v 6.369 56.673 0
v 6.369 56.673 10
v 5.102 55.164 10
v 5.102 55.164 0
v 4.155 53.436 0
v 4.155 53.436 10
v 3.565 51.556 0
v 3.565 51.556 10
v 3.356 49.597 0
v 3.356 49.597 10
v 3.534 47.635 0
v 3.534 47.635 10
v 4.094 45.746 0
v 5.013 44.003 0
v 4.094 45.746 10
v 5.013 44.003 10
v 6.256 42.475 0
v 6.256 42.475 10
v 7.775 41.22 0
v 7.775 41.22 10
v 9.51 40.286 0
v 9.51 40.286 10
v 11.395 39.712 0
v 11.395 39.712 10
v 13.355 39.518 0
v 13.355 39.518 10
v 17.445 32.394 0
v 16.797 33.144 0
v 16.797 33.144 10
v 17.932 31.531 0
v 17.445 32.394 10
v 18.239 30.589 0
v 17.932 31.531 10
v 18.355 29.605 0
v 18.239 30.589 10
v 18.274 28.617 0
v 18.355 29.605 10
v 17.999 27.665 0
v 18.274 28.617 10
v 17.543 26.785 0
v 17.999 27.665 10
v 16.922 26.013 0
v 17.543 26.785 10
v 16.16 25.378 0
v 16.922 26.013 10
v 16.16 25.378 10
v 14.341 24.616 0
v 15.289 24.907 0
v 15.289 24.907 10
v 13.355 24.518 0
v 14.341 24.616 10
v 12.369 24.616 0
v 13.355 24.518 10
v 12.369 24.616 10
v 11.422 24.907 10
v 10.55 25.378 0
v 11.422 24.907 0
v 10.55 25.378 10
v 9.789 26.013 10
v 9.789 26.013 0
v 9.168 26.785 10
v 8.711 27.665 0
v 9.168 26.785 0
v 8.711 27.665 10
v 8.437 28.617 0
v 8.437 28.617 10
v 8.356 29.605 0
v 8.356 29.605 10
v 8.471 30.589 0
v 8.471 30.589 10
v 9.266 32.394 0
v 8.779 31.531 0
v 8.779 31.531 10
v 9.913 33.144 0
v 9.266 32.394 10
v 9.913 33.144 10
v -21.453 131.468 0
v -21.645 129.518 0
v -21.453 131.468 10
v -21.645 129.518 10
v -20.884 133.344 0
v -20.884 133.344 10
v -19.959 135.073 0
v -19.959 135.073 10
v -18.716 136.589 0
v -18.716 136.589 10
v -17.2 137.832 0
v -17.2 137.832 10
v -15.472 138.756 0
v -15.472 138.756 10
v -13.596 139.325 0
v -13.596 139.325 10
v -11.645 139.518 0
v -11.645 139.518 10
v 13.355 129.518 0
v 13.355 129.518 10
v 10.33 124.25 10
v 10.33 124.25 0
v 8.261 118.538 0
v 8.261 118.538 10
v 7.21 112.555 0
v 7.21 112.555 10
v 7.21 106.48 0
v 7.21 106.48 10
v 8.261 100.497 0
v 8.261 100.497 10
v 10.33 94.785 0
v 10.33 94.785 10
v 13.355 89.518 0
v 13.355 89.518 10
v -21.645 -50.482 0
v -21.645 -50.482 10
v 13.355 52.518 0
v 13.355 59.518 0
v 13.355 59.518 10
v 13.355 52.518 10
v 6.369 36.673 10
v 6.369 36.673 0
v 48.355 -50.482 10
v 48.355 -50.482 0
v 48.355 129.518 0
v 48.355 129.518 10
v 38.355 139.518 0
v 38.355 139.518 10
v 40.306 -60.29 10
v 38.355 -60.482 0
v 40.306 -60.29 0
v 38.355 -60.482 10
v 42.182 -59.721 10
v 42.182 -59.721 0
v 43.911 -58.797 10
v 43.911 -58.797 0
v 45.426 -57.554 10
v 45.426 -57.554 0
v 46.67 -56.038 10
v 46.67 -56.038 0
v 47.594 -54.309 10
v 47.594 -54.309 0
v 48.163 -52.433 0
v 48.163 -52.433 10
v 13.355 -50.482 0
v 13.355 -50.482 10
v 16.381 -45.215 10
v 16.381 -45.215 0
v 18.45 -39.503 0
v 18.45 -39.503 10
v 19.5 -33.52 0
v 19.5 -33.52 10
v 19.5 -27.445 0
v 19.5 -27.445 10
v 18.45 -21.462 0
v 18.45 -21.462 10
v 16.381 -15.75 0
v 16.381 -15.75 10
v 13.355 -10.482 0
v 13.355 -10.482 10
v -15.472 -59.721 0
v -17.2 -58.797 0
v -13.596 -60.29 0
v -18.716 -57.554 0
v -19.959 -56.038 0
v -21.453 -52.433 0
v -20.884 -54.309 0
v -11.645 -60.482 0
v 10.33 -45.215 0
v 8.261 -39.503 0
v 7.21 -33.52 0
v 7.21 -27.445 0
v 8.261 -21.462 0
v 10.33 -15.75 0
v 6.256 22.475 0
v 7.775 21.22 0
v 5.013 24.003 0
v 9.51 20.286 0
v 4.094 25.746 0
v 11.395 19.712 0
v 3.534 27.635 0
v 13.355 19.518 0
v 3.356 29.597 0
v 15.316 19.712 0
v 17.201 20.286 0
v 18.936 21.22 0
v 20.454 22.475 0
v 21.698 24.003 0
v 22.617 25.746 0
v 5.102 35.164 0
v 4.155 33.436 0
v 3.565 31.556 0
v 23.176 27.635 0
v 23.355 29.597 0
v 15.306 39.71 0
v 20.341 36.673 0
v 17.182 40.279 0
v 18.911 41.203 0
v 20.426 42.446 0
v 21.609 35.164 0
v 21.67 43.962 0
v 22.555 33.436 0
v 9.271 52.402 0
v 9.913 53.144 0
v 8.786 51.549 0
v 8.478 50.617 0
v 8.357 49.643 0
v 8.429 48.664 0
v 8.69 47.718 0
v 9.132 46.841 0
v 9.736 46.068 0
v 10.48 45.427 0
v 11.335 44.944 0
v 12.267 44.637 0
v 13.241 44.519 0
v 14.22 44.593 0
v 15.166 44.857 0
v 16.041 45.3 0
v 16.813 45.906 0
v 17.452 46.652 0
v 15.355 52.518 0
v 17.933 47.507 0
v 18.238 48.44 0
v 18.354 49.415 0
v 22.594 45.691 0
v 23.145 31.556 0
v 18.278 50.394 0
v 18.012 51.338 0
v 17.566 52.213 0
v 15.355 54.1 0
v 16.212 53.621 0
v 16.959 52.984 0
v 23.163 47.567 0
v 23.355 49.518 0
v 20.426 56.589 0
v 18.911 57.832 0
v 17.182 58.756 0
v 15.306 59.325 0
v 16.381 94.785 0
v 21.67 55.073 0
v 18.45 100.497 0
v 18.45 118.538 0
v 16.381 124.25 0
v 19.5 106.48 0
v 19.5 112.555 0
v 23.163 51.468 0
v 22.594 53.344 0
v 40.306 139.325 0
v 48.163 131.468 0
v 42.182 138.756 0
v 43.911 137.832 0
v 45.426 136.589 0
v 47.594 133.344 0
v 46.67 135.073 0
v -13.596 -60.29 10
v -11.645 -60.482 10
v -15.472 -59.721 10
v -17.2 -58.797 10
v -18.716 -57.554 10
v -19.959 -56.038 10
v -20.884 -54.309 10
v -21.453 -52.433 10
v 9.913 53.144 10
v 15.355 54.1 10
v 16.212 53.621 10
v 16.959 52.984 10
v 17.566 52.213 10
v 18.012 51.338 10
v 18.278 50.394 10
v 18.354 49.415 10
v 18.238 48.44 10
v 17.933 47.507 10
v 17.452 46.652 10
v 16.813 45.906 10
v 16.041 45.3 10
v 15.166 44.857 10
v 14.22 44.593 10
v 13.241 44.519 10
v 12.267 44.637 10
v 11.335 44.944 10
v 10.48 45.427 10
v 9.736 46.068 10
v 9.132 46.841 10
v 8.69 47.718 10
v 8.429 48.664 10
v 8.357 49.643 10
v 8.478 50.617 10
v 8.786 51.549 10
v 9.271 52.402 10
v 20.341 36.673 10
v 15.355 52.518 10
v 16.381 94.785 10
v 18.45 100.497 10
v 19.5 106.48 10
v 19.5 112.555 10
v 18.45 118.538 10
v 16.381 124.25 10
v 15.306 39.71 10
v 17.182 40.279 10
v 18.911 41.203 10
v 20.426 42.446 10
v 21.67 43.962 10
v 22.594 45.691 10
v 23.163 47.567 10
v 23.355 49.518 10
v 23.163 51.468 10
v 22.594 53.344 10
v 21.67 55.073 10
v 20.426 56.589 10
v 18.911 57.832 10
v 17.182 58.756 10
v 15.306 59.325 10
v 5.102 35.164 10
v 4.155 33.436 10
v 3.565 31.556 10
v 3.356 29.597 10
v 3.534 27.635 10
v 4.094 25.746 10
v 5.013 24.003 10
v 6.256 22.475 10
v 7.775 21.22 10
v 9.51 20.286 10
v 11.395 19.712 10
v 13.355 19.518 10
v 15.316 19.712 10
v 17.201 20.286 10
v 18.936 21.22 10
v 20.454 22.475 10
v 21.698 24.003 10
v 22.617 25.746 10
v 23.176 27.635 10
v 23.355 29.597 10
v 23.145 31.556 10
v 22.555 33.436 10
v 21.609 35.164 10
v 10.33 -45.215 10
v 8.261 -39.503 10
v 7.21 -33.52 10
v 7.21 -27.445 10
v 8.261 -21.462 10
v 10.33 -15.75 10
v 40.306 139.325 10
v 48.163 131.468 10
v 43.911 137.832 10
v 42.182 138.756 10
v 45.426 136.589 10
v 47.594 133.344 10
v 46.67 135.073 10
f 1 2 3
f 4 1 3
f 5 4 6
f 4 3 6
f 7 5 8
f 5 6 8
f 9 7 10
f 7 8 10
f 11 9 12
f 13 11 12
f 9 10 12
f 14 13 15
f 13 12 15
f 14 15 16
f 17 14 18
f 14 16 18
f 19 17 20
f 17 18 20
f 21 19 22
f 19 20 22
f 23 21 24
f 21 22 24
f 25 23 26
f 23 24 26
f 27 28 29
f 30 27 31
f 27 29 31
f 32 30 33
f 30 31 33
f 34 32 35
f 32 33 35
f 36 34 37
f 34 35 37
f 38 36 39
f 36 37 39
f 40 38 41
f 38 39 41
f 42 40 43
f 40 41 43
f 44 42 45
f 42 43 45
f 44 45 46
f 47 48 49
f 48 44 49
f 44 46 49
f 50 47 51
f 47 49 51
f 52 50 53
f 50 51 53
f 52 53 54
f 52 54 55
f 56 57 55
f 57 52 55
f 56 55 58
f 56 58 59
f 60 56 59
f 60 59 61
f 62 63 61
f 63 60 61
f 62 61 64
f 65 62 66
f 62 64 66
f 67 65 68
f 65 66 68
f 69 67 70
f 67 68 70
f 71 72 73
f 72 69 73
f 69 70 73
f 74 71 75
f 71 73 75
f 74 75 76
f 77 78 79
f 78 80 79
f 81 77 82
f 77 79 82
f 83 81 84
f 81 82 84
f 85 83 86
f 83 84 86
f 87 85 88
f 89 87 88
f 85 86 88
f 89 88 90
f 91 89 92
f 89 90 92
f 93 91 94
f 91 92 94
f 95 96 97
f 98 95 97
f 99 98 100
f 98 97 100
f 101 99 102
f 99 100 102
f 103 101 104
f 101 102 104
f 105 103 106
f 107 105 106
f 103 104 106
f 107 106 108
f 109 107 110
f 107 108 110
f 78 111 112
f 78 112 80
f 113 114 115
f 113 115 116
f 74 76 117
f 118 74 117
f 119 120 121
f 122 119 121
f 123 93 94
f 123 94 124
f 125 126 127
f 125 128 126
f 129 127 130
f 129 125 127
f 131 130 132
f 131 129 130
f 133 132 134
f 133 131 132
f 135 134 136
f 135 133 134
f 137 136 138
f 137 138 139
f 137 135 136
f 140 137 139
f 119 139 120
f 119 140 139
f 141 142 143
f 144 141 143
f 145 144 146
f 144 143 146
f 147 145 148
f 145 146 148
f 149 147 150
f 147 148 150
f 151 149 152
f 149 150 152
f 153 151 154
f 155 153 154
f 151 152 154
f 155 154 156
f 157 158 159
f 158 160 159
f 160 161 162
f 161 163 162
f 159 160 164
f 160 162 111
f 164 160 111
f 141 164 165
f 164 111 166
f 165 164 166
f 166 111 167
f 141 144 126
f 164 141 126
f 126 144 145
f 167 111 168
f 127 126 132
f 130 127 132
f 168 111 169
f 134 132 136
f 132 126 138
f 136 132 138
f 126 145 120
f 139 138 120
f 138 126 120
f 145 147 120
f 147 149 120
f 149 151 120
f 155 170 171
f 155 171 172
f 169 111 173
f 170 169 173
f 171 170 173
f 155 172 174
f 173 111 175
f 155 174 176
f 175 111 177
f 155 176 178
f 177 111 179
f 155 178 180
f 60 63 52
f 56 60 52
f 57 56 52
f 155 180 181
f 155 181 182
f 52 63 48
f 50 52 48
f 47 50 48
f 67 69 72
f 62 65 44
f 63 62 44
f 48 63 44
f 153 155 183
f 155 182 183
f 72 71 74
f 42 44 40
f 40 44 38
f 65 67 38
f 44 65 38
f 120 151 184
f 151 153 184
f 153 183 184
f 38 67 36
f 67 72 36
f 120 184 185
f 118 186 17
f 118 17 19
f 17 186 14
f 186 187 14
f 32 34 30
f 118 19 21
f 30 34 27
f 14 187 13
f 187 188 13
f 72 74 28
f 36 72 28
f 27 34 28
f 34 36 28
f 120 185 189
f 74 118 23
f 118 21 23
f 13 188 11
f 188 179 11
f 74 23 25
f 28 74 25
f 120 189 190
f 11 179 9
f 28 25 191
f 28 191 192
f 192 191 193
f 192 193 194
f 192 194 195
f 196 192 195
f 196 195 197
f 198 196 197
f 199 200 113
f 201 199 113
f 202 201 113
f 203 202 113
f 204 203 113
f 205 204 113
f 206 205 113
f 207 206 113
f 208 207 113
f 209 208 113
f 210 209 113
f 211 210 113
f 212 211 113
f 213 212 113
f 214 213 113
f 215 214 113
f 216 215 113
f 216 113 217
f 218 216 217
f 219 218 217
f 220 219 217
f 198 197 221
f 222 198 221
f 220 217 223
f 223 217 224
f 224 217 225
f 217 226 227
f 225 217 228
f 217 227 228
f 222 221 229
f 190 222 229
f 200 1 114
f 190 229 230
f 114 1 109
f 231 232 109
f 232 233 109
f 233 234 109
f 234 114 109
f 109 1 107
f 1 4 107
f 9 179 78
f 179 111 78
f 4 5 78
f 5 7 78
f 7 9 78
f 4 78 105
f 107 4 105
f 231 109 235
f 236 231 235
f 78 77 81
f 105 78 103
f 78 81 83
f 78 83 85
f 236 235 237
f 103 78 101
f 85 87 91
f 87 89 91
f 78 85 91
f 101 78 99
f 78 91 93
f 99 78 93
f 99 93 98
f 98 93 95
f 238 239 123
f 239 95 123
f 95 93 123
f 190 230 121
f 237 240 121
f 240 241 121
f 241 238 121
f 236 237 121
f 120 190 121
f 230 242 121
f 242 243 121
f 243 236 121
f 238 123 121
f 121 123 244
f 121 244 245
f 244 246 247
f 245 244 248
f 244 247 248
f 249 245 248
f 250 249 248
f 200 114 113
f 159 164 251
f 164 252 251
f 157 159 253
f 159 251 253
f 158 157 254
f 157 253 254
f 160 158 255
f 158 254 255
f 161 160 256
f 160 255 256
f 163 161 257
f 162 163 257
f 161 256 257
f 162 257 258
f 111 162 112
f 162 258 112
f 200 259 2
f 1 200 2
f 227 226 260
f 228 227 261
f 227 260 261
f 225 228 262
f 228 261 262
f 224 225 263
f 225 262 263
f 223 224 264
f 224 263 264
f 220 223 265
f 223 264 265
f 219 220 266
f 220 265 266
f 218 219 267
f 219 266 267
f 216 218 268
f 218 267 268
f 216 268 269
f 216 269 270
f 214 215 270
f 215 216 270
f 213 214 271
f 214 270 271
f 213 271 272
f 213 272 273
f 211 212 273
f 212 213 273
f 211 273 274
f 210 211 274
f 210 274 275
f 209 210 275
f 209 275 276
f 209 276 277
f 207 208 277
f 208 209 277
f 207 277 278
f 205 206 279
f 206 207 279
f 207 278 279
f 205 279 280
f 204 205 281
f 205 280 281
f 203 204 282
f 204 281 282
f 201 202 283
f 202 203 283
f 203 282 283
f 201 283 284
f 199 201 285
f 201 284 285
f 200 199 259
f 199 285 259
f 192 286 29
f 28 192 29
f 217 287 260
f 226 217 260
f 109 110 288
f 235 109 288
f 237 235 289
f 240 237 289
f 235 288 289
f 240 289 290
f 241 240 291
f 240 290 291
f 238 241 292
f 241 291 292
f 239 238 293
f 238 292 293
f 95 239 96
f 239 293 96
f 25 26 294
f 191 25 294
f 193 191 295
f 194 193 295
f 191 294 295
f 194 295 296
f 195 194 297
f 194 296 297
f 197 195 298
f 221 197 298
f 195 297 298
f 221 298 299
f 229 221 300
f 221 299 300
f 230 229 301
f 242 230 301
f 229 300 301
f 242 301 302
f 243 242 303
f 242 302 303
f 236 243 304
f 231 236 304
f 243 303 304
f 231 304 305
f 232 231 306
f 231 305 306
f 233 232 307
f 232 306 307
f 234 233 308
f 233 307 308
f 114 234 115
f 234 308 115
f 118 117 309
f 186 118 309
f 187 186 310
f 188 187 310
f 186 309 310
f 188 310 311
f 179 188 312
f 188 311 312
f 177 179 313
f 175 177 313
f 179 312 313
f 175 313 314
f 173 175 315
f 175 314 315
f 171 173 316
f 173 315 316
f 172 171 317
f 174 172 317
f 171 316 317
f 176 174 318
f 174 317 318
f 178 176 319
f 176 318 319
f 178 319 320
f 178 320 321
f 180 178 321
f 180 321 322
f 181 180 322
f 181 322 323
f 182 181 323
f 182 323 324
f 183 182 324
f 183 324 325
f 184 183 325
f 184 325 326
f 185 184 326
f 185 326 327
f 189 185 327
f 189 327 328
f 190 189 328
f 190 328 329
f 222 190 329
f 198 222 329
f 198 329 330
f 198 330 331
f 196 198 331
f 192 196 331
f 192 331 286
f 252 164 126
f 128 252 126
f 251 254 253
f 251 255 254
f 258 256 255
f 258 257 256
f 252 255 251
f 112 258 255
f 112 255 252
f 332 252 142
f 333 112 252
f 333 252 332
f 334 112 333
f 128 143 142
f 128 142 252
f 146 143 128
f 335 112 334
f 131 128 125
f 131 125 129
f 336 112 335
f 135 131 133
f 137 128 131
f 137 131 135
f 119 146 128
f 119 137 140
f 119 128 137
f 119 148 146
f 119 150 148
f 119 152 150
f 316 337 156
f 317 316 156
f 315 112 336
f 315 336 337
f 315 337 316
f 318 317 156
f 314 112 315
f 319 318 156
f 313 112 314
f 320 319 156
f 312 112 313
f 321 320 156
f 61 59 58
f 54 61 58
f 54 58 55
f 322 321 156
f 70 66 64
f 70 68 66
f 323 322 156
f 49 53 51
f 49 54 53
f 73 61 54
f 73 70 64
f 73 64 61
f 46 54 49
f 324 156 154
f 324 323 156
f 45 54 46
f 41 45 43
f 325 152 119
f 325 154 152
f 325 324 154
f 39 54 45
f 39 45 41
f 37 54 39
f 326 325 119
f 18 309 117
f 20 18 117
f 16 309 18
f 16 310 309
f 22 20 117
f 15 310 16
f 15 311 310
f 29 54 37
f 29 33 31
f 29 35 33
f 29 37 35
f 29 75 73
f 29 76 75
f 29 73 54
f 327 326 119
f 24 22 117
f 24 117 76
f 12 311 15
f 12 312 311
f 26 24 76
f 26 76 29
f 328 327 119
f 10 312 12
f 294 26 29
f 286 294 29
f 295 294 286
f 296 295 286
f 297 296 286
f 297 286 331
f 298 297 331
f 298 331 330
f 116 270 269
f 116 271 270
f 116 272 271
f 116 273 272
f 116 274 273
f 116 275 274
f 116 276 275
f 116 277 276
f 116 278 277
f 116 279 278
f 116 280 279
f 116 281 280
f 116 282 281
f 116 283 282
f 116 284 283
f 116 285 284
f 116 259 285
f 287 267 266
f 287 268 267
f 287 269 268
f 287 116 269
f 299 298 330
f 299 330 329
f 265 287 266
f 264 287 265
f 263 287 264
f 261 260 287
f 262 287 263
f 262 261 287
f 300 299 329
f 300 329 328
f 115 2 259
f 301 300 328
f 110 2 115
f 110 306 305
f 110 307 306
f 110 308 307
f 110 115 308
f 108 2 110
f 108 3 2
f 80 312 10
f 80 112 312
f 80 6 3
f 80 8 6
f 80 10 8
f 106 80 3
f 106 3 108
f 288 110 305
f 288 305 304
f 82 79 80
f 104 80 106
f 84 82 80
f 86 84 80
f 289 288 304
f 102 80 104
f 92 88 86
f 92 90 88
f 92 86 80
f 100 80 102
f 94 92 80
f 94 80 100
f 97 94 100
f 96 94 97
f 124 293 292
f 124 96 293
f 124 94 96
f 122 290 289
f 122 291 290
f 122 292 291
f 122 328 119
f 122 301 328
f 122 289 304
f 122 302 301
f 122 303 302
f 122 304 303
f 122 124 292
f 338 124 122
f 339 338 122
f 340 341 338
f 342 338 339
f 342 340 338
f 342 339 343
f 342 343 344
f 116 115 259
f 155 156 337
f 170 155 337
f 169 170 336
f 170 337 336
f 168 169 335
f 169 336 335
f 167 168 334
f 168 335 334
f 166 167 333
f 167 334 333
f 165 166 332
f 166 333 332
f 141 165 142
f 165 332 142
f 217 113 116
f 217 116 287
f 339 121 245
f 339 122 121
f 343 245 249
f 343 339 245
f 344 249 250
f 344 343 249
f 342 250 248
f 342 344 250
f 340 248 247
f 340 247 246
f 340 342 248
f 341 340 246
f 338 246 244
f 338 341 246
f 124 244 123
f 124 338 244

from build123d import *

# Parameters (mm, degrees)
F0_W     = 70
F0_H     = 200
F1_DEPTH = 10
F3_DEPTH = 25
F4_DEPTH = 25
F5_R     = 10
F6_R     = 10


with BuildPart() as f1:
    # F0 (on Top) → F1 (new body)
    with BuildSketch(Plane.XY):
        with Locations((13.355264, 39.517543)):
            Rectangle(F0_W, F0_H)
    extrude(amount=F1_DEPTH)

    # F2 (on face) → F3 (cut)
    with BuildSketch(Plane.XY.offset(10)):
        with BuildLine():
            ThreePointArc((13.355264, 129.517543), (7.078077, 109.517543), (13.355264, 89.517543))
            ThreePointArc((13.355264, 89.517543), (19.63245, 109.517543), (13.355264, 129.517543))
        make_face()
        with BuildLine():
            ThreePointArc((13.355264, -10.482457), (7.078077, -30.482457), (13.355264, -50.482457))
            ThreePointArc((13.355264, -50.482457), (19.63245, -30.482457), (13.355264, -10.482457))
        make_face()
        with BuildLine():
            Line((9.913476, 33.144401), (6.369316, 36.672719))
            ThreePointArc((6.369316, 36.672719), (13.355264, 19.517543), (20.341211, 36.672719))
            Line((20.341211, 36.672719), (16.797051, 33.144401))
            ThreePointArc((16.797051, 33.144401), (13.355264, 24.517543), (9.913476, 33.144401))
        make_face()
        with BuildLine():
            Line((9.913476, 53.144401), (6.369316, 56.672719))
            ThreePointArc((6.369316, 56.672719), (4.093737, 45.746055), (13.355264, 39.517543))
            ThreePointArc((13.355264, 39.517543), (23.355264, 49.517543), (13.355264, 59.517543))
            Line((13.355264, 59.517543), (13.355264, 54.517543))
            Line((13.355264, 54.517543), (13.355264, 52.517543))
            Line((13.355264, 52.517543), (15.355264, 52.517543))
            Line((15.355264, 52.517543), (15.355264, 54.100118))
            ThreePointArc((15.355264, 54.100118), (14.220155, 44.592915), (9.913476, 53.144401))
        make_face()
    extrude(amount=-F3_DEPTH, mode=Mode.SUBTRACT)

    # F2 (on face) → F4 (cut)
    with BuildSketch(Plane.XY.offset(10)):
        with BuildLine():
            ThreePointArc((13.355264, 129.517543), (7.078077, 109.517543), (13.355264, 89.517543))
            ThreePointArc((13.355264, 89.517543), (19.63245, 109.517543), (13.355264, 129.517543))
        make_face()
        with BuildLine():
            ThreePointArc((13.355264, -10.482457), (7.078077, -30.482457), (13.355264, -50.482457))
            ThreePointArc((13.355264, -50.482457), (19.63245, -30.482457), (13.355264, -10.482457))
        make_face()
        with BuildLine():
            Line((9.913476, 33.144401), (6.369316, 36.672719))
            ThreePointArc((6.369316, 36.672719), (13.355264, 19.517543), (20.341211, 36.672719))
            Line((20.341211, 36.672719), (16.797051, 33.144401))
            ThreePointArc((16.797051, 33.144401), (13.355264, 24.517543), (9.913476, 33.144401))
        make_face()
        with BuildLine():
            Line((9.913476, 53.144401), (6.369316, 56.672719))
            ThreePointArc((6.369316, 56.672719), (4.093737, 45.746055), (13.355264, 39.517543))
            ThreePointArc((13.355264, 39.517543), (23.355264, 49.517543), (13.355264, 59.517543))
            Line((13.355264, 59.517543), (13.355264, 54.517543))
            Line((13.355264, 54.517543), (13.355264, 52.517543))
            Line((13.355264, 52.517543), (15.355264, 52.517543))
            Line((15.355264, 52.517543), (15.355264, 54.100118))
            ThreePointArc((15.355264, 54.100118), (14.220155, 44.592915), (9.913476, 53.144401))
        make_face()
    extrude(amount=-F4_DEPTH, mode=Mode.SUBTRACT)

    # F5
    f5_edges = [f1.edges().sort_by_distance(p)[0] for p in [
        (48.355264, -60.482457, 5),
    ]]
    fillet(f5_edges, radius=F5_R)

    # F6
    f6_edges = [f1.edges().sort_by_distance(p)[0] for p in [
        (-21.644736, -60.482457, 5),
        (-21.644736, 139.517543, 5),
        (48.355264, 139.517543, 5),
    ]]
    fillet(f6_edges, radius=F6_R)


solid = f1.part
